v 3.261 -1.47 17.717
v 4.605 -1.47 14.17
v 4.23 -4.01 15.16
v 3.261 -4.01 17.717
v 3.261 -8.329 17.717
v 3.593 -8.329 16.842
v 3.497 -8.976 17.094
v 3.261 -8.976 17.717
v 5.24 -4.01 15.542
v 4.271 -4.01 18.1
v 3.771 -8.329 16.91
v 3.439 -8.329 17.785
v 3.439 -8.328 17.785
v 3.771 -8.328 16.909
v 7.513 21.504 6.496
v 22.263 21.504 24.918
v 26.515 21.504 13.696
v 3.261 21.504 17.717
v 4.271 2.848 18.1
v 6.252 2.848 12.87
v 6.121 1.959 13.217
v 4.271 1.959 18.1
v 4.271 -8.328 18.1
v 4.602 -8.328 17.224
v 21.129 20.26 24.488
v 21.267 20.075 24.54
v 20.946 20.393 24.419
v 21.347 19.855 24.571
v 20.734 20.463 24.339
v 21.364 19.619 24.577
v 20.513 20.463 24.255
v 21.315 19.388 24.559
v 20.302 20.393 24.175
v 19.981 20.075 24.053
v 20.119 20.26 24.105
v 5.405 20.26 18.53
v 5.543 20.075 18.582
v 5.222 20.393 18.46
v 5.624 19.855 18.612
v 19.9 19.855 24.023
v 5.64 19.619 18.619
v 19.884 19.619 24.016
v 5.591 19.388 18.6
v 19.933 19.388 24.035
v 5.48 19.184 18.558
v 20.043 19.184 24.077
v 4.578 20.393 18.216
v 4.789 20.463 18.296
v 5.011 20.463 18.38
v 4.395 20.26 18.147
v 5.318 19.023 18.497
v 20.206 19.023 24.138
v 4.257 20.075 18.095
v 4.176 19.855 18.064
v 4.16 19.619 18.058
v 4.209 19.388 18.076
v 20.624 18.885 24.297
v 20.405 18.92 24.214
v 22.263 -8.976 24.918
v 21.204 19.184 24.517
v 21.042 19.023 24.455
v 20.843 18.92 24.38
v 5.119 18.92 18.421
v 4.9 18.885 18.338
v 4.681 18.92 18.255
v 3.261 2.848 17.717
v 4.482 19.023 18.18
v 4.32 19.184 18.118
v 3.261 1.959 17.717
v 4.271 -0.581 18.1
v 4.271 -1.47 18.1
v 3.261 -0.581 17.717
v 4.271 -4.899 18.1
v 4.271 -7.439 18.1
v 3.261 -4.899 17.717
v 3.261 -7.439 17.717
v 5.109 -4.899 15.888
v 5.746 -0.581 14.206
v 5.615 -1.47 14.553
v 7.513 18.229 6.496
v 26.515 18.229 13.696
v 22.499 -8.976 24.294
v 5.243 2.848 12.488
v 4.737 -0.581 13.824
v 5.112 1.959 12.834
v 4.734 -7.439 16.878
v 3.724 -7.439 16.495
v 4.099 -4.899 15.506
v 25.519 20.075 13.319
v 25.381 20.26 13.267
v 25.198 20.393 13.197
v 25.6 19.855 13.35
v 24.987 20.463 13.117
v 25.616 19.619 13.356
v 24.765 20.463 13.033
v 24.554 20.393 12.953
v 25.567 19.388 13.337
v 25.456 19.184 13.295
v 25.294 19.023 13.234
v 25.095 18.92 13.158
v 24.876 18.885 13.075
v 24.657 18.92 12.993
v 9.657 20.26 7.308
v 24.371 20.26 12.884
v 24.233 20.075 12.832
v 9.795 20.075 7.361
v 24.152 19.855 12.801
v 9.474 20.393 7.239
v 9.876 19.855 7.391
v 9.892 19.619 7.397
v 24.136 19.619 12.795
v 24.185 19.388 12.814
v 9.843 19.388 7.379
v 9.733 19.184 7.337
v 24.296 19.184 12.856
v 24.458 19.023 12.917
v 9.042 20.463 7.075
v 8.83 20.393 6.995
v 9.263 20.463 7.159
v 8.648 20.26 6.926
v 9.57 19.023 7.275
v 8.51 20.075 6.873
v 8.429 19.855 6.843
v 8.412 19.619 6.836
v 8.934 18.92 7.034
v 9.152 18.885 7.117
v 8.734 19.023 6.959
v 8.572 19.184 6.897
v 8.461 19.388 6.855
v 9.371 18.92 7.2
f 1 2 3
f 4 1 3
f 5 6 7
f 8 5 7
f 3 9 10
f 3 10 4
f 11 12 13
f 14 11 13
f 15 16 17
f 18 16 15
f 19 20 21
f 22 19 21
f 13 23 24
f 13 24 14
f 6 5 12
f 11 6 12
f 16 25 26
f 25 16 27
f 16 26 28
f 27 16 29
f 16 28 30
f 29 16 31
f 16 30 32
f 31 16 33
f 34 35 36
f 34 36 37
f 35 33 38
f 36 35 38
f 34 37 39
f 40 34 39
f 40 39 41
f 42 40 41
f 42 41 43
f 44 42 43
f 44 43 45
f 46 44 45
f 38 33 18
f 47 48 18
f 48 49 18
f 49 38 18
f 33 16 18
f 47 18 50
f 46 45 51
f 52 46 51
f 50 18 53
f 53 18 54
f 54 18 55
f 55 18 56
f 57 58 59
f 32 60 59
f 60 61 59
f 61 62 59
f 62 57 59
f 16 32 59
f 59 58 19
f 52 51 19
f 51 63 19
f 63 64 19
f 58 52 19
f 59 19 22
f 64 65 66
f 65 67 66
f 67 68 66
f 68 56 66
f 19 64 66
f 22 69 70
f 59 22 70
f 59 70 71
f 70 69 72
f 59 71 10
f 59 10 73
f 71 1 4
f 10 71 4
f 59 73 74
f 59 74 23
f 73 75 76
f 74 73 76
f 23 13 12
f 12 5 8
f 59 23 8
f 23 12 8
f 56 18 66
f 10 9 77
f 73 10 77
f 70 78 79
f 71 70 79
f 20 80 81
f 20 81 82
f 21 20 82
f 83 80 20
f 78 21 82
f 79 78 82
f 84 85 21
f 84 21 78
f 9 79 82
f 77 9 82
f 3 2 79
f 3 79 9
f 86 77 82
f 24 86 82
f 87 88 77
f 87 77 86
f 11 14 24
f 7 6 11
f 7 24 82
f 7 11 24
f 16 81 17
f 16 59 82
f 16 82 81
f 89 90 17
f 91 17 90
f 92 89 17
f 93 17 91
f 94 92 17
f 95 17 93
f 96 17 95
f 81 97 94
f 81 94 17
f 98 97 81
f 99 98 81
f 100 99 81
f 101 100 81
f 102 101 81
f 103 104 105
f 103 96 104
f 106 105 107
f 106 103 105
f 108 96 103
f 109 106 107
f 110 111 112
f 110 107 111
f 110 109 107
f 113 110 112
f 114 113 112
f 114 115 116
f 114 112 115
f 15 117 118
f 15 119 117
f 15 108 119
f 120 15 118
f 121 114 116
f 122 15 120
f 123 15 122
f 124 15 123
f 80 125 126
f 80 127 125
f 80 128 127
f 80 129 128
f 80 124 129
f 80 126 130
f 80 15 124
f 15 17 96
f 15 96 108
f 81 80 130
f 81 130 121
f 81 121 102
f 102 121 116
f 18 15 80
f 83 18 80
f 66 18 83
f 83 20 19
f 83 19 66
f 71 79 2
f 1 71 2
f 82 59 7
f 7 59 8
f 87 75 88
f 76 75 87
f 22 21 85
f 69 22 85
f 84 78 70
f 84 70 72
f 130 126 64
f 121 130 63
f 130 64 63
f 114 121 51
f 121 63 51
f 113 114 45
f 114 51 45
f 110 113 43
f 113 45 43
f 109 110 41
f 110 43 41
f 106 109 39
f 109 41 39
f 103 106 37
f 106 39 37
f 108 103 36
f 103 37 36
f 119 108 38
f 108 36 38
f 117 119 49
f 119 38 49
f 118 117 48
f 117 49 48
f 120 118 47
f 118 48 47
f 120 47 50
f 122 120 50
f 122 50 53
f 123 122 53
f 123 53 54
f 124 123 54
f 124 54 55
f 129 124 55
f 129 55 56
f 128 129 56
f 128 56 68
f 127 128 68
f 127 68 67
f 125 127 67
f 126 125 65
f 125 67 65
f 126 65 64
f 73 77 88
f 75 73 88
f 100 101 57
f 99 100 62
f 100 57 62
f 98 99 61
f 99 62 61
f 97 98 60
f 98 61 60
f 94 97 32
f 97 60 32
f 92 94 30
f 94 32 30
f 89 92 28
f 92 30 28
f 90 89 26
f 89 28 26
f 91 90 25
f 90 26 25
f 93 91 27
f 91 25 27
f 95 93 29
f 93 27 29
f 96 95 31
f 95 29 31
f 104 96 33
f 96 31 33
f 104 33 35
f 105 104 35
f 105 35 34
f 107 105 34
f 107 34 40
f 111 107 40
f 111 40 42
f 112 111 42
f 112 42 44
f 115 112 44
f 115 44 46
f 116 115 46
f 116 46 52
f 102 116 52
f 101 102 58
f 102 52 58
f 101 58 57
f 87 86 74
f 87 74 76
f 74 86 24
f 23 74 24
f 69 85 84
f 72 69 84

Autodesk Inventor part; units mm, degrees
ref_plane "YZ Plane" through (0, 0, 0) normal (1, 0, 0) x (0, 1, 0)
ref_plane "XZ Plane" through (0, 0, 0) normal (0, 1, 0) x (-1, 0, 0)
ref_plane "XY Plane" through (0, 0, 0) normal (0, 0, 1) x (1, 0, 0)
ref_plane "Work Plane1" through (12.7619, -1.356, 21.3175) normal (0.3543575, 0, -0.93511) x (0, -1, 0)
sketch "Sketch1" plane through (12.7619, -1.356, 21.3175) normal (0.3543575, 0, -0.93511) x (0, -1, 0)
  line L0 (-22.86, -10.16) -> (-22.86, 10.16) projected
  line L1 (7.62, -10.16) -> (-22.86, -10.16)
  line L2 (-22.86, 10.16) -> (22.86, 10.16) projected
  line L3 (0.1143, 9.0805) -> (0.1143, 9.9695) projected
  line L4 (-0.7747, 9.0805) -> (0.1143, 9.0805) projected
  line L5 (-0.7747, 9.9695) -> (-0.7747, 9.0805) projected
  line L6 (0.1143, 9.9695) -> (-0.7747, 9.9695) projected
  line L7 (6.9723, 9.0805) -> (6.9723, 9.9695) projected
  line L8 (6.0833, 9.0805) -> (6.9723, 9.0805) projected
  line L9 (6.0833, 9.9695) -> (6.0833, 9.0805) projected
  line L10 (6.9723, 9.9695) -> (6.0833, 9.9695) projected
  line L11 (3.5433, 9.0805) -> (3.5433, 9.9695) projected
  line L12 (2.6543, 9.0805) -> (3.5433, 9.0805) projected
  line L13 (2.6543, 9.9695) -> (2.6543, 9.0805) projected
  line L14 (3.5433, 9.9695) -> (2.6543, 9.9695) projected
  line L15 (-3.3147, 9.0805) -> (-3.3147, 9.9695) projected
  line L16 (-4.2037, 9.0805) -> (-3.3147, 9.0805) projected
  line L17 (-4.2037, 9.9695) -> (-4.2037, 9.0805) projected
  line L18 (-3.3147, 9.9695) -> (-4.2037, 9.9695) projected
  circle A0 centre (21.0344, 8.4074) radius 0.7937 projected
  circle A1 centre (21.0344, -8.4074) radius 0.7937 projected
  circle A2 centre (-21.0344, 8.4074) radius 0.7937 projected
  circle A3 centre (-21.0344, -8.4074) radius 0.7937 projected
  line L19 (-4.2037, 9.9695) -> (-4.2037, 10.16)
  line L20 (-3.3147, 9.9695) -> (-3.3147, 10.16)
  line L21 (-0.7747, 9.9695) -> (-0.7747, 10.16)
  line L22 (0.1143, 9.9695) -> (0.1143, 10.16)
  line L23 (2.6543, 9.9695) -> (2.6543, 10.16)
  line L24 (3.5433, 9.9695) -> (3.5433, 10.16)
  line L25 (-22.86, -10.16) -> (7.62, -10.16)
  line L26 (7.62, -10.16) -> (7.62, 10.16)
  point P0 (-1.356, 19.4878)
  dimension "d0" = 30.48
extrude "Extrusion1" add sketch "Sketch1" along normal blind 12 contours L0 L2 L19 L17 L16 L15 L20 L21 L5 L4 L3 L22 L23 L13 L12 L11 L24 L26 L1
sketch "Sketch2" plane through (17.0142, -1.356, 10.0962) normal (0.3543575, 0, -0.93511) x (-0.93511, 0, -0.3543575)
  line L0 (9.9695, -6.0833) -> (10.1821, -6.0833)
  line L1 (10.1821, -6.0833) -> (10.1821, -6.9734)
  line L2 (10.1821, -6.9734) -> (9.9695, -6.9734)
  line L3 (9.9695, -6.9734) -> (9.9695, -6.0833)
  point P0 (19.4878, 1.356)
extrude "Extrusion2" cut sketch "Sketch2" against normal through all
sketch "Sketch3" plane through (3.2612, 2.8477, 17.7172) normal (-0.93511, 0, -0.3543575) x (-0.3543575, 0, 0.93511)
  line L0 (-12, 0) -> (-12, 18.6563) projected
  line L1 (-12, 15.3816) -> (-0.6665, -11.8237)
  line L2 (0, -11.8237) -> (-12, -11.8237) projected
  line L3 (-0.6665, -11.8237) -> (-12, -11.8237)
  line L4 (-12, -11.8237) -> (-12, 15.3816)
  point P0 (-15.4119, -2.8477)
extrude "Extrusion3" cut sketch "Sketch3" against normal through all
properties part number "USSensor Backing"
